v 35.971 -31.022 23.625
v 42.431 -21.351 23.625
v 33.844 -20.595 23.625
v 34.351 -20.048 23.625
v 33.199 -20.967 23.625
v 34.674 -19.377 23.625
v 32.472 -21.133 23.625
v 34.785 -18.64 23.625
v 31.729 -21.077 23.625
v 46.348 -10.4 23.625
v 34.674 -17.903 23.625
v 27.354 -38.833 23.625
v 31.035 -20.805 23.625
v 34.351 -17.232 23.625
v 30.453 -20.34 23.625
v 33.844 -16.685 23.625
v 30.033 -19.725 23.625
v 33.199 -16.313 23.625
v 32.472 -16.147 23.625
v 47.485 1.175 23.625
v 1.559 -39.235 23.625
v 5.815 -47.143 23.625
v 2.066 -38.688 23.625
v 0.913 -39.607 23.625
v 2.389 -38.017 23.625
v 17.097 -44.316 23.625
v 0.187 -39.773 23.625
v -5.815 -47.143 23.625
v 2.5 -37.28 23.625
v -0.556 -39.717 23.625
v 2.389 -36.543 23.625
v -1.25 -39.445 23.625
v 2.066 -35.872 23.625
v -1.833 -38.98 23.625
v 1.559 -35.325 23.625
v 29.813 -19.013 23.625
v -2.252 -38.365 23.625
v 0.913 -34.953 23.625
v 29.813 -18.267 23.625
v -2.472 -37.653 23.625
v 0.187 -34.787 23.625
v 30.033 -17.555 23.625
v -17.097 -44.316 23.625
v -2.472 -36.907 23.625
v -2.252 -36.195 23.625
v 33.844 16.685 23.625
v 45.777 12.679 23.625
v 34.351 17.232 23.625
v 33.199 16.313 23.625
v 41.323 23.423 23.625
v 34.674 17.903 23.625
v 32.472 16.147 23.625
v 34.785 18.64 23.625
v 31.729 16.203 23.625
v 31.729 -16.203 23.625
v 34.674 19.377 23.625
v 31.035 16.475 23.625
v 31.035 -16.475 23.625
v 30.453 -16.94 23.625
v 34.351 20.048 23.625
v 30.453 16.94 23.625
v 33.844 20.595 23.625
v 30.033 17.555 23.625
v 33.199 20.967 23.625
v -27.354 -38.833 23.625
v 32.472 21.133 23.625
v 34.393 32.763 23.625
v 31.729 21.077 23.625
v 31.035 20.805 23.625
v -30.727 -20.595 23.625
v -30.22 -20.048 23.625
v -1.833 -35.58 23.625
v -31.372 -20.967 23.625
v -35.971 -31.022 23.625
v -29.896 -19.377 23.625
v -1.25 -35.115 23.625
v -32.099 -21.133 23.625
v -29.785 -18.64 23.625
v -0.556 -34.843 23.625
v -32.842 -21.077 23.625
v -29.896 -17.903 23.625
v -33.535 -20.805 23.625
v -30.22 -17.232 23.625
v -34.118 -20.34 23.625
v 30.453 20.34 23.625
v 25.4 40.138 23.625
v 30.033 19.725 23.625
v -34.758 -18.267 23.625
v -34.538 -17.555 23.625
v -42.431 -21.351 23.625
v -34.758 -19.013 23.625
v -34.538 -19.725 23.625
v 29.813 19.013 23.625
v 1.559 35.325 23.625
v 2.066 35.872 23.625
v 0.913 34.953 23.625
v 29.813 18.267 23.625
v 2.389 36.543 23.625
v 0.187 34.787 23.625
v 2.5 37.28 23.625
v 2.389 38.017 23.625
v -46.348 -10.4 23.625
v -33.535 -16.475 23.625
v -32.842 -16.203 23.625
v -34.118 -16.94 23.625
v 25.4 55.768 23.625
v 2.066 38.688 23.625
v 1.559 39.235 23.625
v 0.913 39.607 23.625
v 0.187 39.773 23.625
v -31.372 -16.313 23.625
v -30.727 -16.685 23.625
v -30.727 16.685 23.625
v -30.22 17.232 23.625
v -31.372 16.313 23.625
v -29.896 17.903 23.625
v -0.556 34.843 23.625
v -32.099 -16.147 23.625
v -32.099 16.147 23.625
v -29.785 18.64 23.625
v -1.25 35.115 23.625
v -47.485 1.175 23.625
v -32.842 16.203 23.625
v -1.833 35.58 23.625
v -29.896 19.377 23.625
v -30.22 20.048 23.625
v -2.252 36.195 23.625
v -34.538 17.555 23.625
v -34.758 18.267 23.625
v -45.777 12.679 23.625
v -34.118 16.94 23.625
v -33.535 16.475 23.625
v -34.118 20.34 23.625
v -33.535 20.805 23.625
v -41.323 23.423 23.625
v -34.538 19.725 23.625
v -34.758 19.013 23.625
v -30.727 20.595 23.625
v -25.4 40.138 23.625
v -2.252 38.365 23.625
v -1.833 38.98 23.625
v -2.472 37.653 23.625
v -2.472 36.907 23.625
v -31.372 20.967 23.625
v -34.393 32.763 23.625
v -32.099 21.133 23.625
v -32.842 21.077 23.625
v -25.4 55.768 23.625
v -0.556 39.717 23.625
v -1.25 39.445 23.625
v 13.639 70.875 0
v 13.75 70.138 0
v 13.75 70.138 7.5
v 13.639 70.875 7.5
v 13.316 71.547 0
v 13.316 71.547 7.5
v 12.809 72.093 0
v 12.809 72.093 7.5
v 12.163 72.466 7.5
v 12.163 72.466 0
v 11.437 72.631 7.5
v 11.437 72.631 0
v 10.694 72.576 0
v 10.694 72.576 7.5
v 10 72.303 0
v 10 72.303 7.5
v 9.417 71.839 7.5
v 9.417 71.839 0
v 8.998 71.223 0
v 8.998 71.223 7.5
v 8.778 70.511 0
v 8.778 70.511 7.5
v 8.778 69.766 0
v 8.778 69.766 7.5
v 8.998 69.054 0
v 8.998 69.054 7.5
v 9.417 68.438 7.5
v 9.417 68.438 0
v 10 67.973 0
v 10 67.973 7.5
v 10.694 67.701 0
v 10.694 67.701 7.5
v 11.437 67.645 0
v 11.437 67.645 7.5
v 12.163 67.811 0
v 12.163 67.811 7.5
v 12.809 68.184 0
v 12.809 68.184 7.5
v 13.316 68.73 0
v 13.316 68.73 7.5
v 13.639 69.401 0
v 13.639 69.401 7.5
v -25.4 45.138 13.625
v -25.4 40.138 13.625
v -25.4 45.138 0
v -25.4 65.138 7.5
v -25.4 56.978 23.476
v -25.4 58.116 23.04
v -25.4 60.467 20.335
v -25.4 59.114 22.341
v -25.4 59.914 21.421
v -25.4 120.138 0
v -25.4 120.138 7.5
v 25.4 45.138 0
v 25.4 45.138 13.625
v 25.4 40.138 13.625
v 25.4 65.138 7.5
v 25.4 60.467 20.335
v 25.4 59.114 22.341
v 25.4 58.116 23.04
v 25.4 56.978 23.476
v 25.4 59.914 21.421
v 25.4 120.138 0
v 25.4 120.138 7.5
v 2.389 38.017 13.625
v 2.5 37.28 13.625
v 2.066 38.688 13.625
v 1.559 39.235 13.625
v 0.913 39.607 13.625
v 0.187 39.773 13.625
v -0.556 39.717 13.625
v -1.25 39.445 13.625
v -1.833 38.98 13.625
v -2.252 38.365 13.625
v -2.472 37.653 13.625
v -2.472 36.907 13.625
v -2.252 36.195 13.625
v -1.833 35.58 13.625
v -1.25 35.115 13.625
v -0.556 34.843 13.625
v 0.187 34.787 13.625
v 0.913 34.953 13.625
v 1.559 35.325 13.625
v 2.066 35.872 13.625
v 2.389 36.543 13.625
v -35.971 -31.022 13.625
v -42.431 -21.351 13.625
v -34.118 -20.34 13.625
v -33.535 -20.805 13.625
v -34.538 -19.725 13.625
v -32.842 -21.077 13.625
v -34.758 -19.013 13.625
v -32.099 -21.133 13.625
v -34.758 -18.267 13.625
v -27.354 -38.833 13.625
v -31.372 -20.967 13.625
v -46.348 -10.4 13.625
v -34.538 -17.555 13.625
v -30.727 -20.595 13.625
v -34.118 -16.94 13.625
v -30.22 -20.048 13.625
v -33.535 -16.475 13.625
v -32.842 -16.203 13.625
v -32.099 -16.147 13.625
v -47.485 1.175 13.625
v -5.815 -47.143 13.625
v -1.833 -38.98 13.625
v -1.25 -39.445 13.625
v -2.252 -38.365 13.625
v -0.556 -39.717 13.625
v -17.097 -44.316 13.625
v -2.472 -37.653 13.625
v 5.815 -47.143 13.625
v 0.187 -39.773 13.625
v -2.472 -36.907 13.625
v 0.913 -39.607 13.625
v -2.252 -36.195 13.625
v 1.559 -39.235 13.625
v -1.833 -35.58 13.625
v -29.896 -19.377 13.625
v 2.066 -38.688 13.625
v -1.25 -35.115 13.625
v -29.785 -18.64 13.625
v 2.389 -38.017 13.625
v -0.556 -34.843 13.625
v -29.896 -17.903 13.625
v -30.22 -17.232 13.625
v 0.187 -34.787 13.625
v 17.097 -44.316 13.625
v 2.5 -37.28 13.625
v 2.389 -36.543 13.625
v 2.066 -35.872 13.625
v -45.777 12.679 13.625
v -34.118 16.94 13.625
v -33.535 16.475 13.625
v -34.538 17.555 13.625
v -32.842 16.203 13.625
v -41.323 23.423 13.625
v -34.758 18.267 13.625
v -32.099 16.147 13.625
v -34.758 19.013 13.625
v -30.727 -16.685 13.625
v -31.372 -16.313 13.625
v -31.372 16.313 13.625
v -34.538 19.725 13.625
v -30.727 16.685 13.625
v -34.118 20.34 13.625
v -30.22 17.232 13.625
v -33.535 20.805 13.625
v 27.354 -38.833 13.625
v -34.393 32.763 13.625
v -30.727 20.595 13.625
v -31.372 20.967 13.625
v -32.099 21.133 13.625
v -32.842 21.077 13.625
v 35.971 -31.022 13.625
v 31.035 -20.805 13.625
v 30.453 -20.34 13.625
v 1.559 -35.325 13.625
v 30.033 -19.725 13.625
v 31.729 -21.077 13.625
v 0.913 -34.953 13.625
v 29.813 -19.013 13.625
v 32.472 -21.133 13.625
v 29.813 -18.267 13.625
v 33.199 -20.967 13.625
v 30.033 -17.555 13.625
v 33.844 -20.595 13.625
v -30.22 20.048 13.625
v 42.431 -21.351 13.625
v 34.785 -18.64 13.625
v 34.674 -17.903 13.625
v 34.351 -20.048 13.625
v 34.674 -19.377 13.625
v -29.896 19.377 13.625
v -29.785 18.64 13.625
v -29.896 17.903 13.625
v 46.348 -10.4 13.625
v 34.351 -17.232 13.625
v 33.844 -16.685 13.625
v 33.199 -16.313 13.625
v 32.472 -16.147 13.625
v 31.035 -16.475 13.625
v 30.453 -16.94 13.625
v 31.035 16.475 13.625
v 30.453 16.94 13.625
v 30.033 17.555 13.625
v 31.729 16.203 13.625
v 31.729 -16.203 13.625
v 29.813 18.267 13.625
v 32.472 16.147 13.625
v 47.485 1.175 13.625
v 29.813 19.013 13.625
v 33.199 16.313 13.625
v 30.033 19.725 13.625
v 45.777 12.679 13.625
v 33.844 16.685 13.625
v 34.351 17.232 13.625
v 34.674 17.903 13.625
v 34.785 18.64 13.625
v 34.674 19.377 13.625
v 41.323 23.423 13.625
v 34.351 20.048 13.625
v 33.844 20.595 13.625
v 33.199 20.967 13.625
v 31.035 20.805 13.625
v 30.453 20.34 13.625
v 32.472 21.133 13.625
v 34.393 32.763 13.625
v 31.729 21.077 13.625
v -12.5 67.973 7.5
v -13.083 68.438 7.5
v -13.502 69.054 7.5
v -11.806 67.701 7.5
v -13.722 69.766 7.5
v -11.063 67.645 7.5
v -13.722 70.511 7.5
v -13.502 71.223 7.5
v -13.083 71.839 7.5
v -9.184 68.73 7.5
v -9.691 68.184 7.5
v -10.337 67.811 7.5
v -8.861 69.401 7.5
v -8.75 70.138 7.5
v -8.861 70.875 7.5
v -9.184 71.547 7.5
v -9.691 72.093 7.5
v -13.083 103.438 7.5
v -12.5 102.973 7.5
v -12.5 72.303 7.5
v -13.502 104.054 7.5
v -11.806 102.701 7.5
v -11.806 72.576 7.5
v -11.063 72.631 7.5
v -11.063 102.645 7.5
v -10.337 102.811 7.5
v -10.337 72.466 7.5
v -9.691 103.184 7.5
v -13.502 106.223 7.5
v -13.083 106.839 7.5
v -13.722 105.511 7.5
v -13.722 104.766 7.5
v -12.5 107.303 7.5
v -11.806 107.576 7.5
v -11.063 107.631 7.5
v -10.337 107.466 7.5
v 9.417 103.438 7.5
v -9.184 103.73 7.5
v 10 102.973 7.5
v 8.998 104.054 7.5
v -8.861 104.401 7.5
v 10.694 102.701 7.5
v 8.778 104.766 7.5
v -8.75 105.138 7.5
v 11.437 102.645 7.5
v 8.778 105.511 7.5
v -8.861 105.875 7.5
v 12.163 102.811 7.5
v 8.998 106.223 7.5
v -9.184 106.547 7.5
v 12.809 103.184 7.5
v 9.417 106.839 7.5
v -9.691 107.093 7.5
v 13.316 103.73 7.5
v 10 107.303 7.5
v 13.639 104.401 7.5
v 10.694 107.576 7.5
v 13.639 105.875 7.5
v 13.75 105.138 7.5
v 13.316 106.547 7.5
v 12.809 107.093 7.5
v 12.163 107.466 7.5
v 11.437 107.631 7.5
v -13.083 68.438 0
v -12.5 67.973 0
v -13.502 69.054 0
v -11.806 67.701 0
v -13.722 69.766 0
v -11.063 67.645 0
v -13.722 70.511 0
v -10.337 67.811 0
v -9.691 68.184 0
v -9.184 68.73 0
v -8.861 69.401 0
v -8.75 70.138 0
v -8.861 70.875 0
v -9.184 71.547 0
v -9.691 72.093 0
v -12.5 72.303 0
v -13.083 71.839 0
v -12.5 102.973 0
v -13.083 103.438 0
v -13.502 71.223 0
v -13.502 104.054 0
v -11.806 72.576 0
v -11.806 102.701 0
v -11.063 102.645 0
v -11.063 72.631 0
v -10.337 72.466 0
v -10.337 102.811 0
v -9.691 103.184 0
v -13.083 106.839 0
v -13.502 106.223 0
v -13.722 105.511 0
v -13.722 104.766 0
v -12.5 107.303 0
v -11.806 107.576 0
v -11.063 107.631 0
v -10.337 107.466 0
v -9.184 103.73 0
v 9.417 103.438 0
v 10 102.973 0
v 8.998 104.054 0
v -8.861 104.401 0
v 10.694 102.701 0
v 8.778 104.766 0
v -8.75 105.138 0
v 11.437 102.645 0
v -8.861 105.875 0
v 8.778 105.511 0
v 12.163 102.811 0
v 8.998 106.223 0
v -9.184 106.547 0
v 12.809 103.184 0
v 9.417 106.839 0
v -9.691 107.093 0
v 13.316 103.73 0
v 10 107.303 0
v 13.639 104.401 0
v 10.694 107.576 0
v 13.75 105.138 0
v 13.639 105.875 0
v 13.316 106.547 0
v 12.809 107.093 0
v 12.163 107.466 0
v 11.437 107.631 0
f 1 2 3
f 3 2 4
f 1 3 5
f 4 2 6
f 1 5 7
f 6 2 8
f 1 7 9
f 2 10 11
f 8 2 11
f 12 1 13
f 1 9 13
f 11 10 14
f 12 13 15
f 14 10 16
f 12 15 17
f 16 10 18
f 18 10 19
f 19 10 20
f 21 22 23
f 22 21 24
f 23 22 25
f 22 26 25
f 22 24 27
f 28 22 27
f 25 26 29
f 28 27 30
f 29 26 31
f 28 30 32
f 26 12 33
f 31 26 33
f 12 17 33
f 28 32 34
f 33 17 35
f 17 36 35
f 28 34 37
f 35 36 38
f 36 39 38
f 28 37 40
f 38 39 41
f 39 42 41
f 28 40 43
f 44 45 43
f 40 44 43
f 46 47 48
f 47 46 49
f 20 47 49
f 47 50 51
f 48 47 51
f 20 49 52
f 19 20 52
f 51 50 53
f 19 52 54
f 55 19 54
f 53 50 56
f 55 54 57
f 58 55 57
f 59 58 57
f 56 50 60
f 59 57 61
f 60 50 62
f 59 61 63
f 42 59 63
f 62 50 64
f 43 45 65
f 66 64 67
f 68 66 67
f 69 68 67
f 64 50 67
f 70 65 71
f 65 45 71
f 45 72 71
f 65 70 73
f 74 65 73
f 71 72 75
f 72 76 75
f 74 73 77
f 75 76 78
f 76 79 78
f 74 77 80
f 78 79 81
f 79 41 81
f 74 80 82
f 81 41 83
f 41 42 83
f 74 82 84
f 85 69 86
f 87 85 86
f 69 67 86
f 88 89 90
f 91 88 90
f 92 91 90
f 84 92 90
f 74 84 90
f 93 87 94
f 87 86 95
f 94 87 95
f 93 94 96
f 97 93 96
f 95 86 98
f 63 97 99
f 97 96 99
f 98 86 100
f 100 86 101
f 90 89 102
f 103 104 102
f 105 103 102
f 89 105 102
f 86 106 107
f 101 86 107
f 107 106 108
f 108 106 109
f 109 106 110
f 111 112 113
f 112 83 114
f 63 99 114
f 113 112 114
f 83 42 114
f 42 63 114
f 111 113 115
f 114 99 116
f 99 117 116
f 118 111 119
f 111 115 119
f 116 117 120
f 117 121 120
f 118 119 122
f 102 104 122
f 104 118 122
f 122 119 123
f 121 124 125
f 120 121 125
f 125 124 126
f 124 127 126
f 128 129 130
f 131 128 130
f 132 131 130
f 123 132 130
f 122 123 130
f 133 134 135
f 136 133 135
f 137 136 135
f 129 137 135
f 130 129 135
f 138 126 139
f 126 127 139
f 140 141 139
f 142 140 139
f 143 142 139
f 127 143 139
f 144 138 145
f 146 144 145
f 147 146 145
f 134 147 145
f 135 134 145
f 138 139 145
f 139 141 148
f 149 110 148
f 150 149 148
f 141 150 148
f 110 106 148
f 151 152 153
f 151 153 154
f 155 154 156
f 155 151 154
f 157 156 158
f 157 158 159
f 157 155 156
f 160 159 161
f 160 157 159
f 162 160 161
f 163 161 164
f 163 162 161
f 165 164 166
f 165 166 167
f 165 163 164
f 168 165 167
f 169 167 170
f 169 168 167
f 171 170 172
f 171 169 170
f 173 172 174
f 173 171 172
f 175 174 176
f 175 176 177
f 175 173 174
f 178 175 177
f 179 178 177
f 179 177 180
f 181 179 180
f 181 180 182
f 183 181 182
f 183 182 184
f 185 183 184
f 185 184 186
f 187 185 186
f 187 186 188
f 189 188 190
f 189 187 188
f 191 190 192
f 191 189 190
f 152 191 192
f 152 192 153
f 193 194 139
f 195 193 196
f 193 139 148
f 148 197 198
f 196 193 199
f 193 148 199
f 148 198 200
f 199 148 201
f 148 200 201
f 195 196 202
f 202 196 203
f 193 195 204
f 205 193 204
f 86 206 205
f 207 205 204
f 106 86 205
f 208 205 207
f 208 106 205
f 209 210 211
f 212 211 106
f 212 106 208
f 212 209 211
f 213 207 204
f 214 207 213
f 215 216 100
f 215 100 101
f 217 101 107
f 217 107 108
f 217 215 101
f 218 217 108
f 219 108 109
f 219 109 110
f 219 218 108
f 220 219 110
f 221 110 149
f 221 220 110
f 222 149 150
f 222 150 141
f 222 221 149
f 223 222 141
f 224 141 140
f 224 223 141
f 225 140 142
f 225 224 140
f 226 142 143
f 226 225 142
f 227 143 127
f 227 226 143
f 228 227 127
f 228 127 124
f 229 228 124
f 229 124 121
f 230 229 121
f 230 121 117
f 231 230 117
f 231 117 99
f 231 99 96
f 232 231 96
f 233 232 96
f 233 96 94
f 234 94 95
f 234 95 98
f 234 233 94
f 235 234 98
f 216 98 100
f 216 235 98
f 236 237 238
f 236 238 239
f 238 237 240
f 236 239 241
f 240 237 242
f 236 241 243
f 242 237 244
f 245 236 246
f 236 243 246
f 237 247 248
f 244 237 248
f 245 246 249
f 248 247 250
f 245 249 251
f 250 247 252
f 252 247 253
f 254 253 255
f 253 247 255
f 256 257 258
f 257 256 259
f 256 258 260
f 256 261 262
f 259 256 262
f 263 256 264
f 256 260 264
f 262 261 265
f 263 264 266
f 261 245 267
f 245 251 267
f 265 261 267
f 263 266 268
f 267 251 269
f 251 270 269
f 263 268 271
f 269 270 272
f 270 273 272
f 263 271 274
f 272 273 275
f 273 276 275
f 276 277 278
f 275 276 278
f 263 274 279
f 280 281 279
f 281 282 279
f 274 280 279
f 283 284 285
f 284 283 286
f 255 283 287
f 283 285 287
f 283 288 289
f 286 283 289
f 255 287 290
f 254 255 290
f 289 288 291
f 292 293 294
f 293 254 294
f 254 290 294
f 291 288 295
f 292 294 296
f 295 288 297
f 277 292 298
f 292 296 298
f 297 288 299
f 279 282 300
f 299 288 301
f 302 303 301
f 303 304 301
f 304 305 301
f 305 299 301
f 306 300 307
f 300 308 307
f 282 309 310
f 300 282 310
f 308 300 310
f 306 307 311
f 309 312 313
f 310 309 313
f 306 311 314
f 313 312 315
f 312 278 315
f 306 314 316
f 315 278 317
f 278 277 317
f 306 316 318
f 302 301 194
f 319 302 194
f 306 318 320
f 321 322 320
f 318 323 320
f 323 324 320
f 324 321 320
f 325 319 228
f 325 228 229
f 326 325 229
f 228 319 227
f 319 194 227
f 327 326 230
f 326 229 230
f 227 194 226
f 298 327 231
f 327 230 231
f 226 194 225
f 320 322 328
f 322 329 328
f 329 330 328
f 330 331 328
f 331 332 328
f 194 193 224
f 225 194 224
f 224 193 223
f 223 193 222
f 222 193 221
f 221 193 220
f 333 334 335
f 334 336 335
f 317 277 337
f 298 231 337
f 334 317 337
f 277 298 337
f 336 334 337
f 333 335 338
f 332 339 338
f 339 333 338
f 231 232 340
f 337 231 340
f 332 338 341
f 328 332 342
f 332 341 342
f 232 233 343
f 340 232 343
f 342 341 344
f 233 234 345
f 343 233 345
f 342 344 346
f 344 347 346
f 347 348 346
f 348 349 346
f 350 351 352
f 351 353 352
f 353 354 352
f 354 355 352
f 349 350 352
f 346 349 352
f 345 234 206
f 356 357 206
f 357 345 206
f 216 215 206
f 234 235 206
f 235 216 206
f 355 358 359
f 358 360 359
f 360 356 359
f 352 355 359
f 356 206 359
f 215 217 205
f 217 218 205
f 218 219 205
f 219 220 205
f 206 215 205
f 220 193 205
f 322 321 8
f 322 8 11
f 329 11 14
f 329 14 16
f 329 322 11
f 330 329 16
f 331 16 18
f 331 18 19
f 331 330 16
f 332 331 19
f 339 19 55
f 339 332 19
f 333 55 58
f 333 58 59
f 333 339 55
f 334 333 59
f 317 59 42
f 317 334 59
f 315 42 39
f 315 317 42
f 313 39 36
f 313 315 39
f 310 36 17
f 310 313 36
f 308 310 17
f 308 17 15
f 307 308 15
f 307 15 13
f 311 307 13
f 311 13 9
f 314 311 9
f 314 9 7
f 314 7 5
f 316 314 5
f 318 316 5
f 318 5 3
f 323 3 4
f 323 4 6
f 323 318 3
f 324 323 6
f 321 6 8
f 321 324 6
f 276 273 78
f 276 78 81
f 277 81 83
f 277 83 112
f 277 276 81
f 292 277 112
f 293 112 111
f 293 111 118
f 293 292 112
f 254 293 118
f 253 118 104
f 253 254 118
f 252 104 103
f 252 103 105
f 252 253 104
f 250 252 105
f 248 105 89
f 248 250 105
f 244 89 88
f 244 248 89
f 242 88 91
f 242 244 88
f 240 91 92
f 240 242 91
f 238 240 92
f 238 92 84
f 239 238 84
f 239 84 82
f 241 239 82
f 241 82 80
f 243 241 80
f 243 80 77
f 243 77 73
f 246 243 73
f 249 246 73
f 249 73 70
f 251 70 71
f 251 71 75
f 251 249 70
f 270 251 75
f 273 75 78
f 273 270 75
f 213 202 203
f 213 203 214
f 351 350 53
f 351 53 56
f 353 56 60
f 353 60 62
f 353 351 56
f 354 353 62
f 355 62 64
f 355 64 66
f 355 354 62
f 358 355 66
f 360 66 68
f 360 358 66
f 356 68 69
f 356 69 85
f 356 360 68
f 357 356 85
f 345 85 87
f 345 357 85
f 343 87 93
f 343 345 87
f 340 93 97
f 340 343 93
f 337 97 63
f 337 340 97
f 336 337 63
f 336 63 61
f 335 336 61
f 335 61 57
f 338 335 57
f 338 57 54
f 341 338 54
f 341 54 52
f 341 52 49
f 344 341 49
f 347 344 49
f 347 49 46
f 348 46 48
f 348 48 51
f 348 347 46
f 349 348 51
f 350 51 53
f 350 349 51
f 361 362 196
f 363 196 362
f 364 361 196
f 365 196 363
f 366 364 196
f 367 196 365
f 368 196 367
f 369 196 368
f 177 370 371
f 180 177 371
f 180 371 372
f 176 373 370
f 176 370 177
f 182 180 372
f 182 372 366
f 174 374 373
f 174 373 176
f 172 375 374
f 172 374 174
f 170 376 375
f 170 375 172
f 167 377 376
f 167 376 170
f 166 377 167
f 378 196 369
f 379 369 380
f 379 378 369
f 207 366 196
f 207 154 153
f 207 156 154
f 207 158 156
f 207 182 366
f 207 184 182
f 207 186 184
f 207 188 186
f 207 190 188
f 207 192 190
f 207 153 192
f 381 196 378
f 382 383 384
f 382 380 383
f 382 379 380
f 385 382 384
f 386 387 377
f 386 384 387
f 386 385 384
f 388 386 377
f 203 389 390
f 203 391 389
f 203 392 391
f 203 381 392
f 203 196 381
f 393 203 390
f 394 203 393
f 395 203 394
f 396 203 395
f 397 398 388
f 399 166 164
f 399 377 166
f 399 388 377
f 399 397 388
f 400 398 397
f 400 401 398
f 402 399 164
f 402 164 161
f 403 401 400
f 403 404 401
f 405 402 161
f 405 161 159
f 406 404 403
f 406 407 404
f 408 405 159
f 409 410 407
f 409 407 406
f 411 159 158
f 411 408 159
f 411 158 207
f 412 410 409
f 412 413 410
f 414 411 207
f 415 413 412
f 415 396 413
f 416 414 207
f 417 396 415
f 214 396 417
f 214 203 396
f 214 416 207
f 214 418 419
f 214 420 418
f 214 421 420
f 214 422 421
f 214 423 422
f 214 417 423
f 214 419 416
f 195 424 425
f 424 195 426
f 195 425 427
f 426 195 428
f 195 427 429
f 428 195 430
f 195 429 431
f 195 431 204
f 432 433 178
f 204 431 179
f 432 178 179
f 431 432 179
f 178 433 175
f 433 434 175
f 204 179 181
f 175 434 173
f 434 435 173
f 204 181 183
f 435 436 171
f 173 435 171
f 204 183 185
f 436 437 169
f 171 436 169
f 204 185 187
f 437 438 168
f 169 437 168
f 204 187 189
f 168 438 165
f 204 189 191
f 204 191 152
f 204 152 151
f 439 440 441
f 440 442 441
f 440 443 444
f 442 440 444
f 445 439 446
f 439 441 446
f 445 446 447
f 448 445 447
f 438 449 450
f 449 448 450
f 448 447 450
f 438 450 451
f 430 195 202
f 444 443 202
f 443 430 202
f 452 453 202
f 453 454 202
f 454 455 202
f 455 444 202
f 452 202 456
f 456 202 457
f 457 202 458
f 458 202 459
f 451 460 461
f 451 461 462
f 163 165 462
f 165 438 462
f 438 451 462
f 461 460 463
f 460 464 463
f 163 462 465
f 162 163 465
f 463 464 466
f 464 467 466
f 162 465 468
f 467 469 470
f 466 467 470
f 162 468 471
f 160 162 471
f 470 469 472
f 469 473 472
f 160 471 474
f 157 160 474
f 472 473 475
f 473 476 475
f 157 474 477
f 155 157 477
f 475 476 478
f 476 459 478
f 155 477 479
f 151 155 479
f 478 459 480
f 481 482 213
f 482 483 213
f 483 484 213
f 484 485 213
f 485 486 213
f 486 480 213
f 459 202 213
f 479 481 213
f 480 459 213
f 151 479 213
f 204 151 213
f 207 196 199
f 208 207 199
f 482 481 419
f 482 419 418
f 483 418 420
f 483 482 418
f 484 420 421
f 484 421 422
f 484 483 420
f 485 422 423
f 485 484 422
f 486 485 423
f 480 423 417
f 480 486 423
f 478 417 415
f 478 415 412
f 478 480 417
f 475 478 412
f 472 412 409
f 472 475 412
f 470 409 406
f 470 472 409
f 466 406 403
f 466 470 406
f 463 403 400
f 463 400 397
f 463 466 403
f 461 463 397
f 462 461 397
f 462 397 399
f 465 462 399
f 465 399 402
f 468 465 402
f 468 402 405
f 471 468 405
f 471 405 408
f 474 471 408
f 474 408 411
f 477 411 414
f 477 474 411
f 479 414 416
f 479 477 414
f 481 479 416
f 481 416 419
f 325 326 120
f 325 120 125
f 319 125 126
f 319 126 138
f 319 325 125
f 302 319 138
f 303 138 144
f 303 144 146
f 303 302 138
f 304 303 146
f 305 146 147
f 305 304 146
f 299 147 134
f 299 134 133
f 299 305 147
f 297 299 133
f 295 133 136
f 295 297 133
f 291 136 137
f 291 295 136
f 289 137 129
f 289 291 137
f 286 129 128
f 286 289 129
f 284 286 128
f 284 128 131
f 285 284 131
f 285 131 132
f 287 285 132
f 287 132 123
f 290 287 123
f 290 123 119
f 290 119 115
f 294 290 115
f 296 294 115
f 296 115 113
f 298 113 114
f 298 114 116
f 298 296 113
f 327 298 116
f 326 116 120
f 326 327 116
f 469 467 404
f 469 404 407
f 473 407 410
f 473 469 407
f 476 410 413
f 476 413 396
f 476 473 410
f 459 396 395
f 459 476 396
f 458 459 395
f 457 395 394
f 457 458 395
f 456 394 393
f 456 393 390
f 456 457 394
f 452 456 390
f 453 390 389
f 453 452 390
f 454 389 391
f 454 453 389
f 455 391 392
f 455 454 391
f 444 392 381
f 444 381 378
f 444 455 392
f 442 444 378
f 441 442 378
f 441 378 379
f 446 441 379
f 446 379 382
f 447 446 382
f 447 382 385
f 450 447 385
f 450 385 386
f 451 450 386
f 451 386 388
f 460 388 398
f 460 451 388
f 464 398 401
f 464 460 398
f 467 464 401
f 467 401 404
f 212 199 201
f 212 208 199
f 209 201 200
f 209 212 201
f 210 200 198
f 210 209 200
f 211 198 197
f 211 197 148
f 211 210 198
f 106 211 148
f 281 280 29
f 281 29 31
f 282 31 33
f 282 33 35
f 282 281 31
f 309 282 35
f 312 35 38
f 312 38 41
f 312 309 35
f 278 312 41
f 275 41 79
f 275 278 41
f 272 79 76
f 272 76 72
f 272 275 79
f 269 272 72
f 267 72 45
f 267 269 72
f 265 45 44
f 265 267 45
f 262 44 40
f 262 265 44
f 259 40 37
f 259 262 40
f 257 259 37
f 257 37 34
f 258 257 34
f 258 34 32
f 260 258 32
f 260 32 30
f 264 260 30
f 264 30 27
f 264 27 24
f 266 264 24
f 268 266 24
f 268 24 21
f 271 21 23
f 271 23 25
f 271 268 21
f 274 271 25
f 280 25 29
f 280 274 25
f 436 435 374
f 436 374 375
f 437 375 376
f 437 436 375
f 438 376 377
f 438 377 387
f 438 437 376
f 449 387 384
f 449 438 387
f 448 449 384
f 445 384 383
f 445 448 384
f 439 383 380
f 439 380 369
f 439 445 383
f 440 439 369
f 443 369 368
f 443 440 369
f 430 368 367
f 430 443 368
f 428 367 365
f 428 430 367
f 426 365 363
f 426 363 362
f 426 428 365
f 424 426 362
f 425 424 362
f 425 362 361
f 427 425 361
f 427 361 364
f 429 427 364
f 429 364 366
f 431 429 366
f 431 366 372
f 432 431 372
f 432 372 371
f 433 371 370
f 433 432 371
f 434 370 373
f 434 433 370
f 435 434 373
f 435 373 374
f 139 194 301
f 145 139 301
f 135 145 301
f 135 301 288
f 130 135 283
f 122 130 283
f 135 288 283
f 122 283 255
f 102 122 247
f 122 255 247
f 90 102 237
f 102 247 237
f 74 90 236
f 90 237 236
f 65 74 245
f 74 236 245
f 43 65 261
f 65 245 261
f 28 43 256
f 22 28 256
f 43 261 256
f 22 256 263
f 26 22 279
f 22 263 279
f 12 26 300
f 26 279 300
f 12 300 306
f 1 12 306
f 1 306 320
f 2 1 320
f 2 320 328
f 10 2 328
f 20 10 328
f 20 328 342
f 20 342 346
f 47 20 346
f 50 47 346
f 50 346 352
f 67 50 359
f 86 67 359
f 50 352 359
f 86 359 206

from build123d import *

# Parameters (mm, degrees)
SKETCH1_W           = 50.8
SKETCH1_H           = 65.000000038
SKETCH1_R           = 2.5
EXTRUDE_5_DEPTH     = 7.5
SKETCH1_3_W         = 50.8
SKETCH1_3_H         = 10
BOSS_EXTRUDE1_DEPTH = 13.625
BOSS_EXTRUDE2_START = 13.625
SKETCH1_4_R         = 2.5
SKETCH1_4_W         = 50.8
SKETCH1_4_H         = 10
BOSS_EXTRUDE2_DEPTH = 10
CHAMFER1_SIZE       = 10
CHAMFER1_SIZE_2     = 27.474774195
FILLET1_R           = 5


with BuildPart() as part:
    # Sketch1 → 5 (new body)
    with BuildSketch(Plane.XY):
        with Locations((0, 87.638385637)):
            Rectangle(SKETCH1_W, SKETCH1_H)
        with Locations((-11.25, 70.138385656)):
            Circle(SKETCH1_R, mode=Mode.SUBTRACT)
        with Locations((-11.25, 105.138385656)):
            Circle(SKETCH1_R, mode=Mode.SUBTRACT)
        with Locations((11.25, 70.138385656)):
            Circle(SKETCH1_R, mode=Mode.SUBTRACT)
        with Locations((11.25, 105.138385656)):
            Circle(SKETCH1_R, mode=Mode.SUBTRACT)
    extrude(amount=EXTRUDE_5_DEPTH)

    # Sketch1<3> → Boss-Extrude1 (add)
    with BuildSketch(Plane.XY):
        with Locations((0, 50.138385618)):
            Rectangle(SKETCH1_3_W, SKETCH1_3_H)
    extrude(amount=BOSS_EXTRUDE1_DEPTH)

    # Sketch1<4> → Boss-Extrude2 (add)
    # profile 1 of 2: a face of its own
    with BuildSketch(Plane.XY.offset(BOSS_EXTRUDE2_START)):
        with BuildLine():
            Line((-25.4, 45.138385618), (-25.4, 40.138385618))
            ThreePointArc((-25.4, 40.138385618), (0, -47.5), (25.4, 40.138385618))
            Line((25.4, 40.138385618), (25.4, 45.138385618))
            Line((25.4, 45.138385618), (-25.4, 45.138385618))
        make_face()
        with Locations((-32.285427053, -18.64)):
            Circle(SKETCH1_4_R, mode=Mode.SUBTRACT)
        with Locations((-32.285427053, 18.64)):
            Circle(SKETCH1_4_R, mode=Mode.SUBTRACT)
        with Locations((0, -37.28)):
            Circle(SKETCH1_4_R, mode=Mode.SUBTRACT)
        with Locations((32.285427053, -18.64)):
            Circle(SKETCH1_4_R, mode=Mode.SUBTRACT)
        with Locations((32.285427053, 18.64)):
            Circle(SKETCH1_4_R, mode=Mode.SUBTRACT)
        with Locations((0, 37.28)):
            Circle(SKETCH1_4_R, mode=Mode.SUBTRACT)
    # profile 2 of 2: a face of its own
    with BuildSketch(Plane.XY.offset(BOSS_EXTRUDE2_START)):
        with Locations((0, 50.138385618)):
            Rectangle(SKETCH1_4_W, SKETCH1_4_H)
    extrude(amount=BOSS_EXTRUDE2_DEPTH)

    # Chamfer1
    # the kernel refuses this chamfer: 27.474774195, 10 mm, written as the material it adds along each edge
    with BuildSketch(Plane(origin=(-25.4, 55.138385618, 7.5), x_dir=(0, 0.9950833631817486, -0.0990409022520505), z_dir=(1, 0, 0))) as chamfer1_piece_1_section:
        Polygon((CHAMFER1_SIZE * 0.995083363182, CHAMFER1_SIZE * 0.0990409022521), (-CHAMFER1_SIZE_2 * 0.0990409022504, CHAMFER1_SIZE_2 * 0.995083363165), (0, 0), align=None)
    chamfer1_piece_1 = extrude(amount=50.8, mode=Mode.PRIVATE)
    chamfer1_piece_1 = split(chamfer1_piece_1, bisect_by=Plane(origin=(0, 58.7545268, 23.625), z_dir=(0, 0, -1)), keep=Keep.TOP, mode=Mode.PRIVATE)
    add(chamfer1_piece_1)

    # Fillet1
    fillet1_edges = [part.edges().sort_by_distance(p)[0] for p in [
        (0, 59.26936559, 23.625),
    ]]
    fillet(fillet1_edges, radius=FILLET1_R)


solid = part.part
